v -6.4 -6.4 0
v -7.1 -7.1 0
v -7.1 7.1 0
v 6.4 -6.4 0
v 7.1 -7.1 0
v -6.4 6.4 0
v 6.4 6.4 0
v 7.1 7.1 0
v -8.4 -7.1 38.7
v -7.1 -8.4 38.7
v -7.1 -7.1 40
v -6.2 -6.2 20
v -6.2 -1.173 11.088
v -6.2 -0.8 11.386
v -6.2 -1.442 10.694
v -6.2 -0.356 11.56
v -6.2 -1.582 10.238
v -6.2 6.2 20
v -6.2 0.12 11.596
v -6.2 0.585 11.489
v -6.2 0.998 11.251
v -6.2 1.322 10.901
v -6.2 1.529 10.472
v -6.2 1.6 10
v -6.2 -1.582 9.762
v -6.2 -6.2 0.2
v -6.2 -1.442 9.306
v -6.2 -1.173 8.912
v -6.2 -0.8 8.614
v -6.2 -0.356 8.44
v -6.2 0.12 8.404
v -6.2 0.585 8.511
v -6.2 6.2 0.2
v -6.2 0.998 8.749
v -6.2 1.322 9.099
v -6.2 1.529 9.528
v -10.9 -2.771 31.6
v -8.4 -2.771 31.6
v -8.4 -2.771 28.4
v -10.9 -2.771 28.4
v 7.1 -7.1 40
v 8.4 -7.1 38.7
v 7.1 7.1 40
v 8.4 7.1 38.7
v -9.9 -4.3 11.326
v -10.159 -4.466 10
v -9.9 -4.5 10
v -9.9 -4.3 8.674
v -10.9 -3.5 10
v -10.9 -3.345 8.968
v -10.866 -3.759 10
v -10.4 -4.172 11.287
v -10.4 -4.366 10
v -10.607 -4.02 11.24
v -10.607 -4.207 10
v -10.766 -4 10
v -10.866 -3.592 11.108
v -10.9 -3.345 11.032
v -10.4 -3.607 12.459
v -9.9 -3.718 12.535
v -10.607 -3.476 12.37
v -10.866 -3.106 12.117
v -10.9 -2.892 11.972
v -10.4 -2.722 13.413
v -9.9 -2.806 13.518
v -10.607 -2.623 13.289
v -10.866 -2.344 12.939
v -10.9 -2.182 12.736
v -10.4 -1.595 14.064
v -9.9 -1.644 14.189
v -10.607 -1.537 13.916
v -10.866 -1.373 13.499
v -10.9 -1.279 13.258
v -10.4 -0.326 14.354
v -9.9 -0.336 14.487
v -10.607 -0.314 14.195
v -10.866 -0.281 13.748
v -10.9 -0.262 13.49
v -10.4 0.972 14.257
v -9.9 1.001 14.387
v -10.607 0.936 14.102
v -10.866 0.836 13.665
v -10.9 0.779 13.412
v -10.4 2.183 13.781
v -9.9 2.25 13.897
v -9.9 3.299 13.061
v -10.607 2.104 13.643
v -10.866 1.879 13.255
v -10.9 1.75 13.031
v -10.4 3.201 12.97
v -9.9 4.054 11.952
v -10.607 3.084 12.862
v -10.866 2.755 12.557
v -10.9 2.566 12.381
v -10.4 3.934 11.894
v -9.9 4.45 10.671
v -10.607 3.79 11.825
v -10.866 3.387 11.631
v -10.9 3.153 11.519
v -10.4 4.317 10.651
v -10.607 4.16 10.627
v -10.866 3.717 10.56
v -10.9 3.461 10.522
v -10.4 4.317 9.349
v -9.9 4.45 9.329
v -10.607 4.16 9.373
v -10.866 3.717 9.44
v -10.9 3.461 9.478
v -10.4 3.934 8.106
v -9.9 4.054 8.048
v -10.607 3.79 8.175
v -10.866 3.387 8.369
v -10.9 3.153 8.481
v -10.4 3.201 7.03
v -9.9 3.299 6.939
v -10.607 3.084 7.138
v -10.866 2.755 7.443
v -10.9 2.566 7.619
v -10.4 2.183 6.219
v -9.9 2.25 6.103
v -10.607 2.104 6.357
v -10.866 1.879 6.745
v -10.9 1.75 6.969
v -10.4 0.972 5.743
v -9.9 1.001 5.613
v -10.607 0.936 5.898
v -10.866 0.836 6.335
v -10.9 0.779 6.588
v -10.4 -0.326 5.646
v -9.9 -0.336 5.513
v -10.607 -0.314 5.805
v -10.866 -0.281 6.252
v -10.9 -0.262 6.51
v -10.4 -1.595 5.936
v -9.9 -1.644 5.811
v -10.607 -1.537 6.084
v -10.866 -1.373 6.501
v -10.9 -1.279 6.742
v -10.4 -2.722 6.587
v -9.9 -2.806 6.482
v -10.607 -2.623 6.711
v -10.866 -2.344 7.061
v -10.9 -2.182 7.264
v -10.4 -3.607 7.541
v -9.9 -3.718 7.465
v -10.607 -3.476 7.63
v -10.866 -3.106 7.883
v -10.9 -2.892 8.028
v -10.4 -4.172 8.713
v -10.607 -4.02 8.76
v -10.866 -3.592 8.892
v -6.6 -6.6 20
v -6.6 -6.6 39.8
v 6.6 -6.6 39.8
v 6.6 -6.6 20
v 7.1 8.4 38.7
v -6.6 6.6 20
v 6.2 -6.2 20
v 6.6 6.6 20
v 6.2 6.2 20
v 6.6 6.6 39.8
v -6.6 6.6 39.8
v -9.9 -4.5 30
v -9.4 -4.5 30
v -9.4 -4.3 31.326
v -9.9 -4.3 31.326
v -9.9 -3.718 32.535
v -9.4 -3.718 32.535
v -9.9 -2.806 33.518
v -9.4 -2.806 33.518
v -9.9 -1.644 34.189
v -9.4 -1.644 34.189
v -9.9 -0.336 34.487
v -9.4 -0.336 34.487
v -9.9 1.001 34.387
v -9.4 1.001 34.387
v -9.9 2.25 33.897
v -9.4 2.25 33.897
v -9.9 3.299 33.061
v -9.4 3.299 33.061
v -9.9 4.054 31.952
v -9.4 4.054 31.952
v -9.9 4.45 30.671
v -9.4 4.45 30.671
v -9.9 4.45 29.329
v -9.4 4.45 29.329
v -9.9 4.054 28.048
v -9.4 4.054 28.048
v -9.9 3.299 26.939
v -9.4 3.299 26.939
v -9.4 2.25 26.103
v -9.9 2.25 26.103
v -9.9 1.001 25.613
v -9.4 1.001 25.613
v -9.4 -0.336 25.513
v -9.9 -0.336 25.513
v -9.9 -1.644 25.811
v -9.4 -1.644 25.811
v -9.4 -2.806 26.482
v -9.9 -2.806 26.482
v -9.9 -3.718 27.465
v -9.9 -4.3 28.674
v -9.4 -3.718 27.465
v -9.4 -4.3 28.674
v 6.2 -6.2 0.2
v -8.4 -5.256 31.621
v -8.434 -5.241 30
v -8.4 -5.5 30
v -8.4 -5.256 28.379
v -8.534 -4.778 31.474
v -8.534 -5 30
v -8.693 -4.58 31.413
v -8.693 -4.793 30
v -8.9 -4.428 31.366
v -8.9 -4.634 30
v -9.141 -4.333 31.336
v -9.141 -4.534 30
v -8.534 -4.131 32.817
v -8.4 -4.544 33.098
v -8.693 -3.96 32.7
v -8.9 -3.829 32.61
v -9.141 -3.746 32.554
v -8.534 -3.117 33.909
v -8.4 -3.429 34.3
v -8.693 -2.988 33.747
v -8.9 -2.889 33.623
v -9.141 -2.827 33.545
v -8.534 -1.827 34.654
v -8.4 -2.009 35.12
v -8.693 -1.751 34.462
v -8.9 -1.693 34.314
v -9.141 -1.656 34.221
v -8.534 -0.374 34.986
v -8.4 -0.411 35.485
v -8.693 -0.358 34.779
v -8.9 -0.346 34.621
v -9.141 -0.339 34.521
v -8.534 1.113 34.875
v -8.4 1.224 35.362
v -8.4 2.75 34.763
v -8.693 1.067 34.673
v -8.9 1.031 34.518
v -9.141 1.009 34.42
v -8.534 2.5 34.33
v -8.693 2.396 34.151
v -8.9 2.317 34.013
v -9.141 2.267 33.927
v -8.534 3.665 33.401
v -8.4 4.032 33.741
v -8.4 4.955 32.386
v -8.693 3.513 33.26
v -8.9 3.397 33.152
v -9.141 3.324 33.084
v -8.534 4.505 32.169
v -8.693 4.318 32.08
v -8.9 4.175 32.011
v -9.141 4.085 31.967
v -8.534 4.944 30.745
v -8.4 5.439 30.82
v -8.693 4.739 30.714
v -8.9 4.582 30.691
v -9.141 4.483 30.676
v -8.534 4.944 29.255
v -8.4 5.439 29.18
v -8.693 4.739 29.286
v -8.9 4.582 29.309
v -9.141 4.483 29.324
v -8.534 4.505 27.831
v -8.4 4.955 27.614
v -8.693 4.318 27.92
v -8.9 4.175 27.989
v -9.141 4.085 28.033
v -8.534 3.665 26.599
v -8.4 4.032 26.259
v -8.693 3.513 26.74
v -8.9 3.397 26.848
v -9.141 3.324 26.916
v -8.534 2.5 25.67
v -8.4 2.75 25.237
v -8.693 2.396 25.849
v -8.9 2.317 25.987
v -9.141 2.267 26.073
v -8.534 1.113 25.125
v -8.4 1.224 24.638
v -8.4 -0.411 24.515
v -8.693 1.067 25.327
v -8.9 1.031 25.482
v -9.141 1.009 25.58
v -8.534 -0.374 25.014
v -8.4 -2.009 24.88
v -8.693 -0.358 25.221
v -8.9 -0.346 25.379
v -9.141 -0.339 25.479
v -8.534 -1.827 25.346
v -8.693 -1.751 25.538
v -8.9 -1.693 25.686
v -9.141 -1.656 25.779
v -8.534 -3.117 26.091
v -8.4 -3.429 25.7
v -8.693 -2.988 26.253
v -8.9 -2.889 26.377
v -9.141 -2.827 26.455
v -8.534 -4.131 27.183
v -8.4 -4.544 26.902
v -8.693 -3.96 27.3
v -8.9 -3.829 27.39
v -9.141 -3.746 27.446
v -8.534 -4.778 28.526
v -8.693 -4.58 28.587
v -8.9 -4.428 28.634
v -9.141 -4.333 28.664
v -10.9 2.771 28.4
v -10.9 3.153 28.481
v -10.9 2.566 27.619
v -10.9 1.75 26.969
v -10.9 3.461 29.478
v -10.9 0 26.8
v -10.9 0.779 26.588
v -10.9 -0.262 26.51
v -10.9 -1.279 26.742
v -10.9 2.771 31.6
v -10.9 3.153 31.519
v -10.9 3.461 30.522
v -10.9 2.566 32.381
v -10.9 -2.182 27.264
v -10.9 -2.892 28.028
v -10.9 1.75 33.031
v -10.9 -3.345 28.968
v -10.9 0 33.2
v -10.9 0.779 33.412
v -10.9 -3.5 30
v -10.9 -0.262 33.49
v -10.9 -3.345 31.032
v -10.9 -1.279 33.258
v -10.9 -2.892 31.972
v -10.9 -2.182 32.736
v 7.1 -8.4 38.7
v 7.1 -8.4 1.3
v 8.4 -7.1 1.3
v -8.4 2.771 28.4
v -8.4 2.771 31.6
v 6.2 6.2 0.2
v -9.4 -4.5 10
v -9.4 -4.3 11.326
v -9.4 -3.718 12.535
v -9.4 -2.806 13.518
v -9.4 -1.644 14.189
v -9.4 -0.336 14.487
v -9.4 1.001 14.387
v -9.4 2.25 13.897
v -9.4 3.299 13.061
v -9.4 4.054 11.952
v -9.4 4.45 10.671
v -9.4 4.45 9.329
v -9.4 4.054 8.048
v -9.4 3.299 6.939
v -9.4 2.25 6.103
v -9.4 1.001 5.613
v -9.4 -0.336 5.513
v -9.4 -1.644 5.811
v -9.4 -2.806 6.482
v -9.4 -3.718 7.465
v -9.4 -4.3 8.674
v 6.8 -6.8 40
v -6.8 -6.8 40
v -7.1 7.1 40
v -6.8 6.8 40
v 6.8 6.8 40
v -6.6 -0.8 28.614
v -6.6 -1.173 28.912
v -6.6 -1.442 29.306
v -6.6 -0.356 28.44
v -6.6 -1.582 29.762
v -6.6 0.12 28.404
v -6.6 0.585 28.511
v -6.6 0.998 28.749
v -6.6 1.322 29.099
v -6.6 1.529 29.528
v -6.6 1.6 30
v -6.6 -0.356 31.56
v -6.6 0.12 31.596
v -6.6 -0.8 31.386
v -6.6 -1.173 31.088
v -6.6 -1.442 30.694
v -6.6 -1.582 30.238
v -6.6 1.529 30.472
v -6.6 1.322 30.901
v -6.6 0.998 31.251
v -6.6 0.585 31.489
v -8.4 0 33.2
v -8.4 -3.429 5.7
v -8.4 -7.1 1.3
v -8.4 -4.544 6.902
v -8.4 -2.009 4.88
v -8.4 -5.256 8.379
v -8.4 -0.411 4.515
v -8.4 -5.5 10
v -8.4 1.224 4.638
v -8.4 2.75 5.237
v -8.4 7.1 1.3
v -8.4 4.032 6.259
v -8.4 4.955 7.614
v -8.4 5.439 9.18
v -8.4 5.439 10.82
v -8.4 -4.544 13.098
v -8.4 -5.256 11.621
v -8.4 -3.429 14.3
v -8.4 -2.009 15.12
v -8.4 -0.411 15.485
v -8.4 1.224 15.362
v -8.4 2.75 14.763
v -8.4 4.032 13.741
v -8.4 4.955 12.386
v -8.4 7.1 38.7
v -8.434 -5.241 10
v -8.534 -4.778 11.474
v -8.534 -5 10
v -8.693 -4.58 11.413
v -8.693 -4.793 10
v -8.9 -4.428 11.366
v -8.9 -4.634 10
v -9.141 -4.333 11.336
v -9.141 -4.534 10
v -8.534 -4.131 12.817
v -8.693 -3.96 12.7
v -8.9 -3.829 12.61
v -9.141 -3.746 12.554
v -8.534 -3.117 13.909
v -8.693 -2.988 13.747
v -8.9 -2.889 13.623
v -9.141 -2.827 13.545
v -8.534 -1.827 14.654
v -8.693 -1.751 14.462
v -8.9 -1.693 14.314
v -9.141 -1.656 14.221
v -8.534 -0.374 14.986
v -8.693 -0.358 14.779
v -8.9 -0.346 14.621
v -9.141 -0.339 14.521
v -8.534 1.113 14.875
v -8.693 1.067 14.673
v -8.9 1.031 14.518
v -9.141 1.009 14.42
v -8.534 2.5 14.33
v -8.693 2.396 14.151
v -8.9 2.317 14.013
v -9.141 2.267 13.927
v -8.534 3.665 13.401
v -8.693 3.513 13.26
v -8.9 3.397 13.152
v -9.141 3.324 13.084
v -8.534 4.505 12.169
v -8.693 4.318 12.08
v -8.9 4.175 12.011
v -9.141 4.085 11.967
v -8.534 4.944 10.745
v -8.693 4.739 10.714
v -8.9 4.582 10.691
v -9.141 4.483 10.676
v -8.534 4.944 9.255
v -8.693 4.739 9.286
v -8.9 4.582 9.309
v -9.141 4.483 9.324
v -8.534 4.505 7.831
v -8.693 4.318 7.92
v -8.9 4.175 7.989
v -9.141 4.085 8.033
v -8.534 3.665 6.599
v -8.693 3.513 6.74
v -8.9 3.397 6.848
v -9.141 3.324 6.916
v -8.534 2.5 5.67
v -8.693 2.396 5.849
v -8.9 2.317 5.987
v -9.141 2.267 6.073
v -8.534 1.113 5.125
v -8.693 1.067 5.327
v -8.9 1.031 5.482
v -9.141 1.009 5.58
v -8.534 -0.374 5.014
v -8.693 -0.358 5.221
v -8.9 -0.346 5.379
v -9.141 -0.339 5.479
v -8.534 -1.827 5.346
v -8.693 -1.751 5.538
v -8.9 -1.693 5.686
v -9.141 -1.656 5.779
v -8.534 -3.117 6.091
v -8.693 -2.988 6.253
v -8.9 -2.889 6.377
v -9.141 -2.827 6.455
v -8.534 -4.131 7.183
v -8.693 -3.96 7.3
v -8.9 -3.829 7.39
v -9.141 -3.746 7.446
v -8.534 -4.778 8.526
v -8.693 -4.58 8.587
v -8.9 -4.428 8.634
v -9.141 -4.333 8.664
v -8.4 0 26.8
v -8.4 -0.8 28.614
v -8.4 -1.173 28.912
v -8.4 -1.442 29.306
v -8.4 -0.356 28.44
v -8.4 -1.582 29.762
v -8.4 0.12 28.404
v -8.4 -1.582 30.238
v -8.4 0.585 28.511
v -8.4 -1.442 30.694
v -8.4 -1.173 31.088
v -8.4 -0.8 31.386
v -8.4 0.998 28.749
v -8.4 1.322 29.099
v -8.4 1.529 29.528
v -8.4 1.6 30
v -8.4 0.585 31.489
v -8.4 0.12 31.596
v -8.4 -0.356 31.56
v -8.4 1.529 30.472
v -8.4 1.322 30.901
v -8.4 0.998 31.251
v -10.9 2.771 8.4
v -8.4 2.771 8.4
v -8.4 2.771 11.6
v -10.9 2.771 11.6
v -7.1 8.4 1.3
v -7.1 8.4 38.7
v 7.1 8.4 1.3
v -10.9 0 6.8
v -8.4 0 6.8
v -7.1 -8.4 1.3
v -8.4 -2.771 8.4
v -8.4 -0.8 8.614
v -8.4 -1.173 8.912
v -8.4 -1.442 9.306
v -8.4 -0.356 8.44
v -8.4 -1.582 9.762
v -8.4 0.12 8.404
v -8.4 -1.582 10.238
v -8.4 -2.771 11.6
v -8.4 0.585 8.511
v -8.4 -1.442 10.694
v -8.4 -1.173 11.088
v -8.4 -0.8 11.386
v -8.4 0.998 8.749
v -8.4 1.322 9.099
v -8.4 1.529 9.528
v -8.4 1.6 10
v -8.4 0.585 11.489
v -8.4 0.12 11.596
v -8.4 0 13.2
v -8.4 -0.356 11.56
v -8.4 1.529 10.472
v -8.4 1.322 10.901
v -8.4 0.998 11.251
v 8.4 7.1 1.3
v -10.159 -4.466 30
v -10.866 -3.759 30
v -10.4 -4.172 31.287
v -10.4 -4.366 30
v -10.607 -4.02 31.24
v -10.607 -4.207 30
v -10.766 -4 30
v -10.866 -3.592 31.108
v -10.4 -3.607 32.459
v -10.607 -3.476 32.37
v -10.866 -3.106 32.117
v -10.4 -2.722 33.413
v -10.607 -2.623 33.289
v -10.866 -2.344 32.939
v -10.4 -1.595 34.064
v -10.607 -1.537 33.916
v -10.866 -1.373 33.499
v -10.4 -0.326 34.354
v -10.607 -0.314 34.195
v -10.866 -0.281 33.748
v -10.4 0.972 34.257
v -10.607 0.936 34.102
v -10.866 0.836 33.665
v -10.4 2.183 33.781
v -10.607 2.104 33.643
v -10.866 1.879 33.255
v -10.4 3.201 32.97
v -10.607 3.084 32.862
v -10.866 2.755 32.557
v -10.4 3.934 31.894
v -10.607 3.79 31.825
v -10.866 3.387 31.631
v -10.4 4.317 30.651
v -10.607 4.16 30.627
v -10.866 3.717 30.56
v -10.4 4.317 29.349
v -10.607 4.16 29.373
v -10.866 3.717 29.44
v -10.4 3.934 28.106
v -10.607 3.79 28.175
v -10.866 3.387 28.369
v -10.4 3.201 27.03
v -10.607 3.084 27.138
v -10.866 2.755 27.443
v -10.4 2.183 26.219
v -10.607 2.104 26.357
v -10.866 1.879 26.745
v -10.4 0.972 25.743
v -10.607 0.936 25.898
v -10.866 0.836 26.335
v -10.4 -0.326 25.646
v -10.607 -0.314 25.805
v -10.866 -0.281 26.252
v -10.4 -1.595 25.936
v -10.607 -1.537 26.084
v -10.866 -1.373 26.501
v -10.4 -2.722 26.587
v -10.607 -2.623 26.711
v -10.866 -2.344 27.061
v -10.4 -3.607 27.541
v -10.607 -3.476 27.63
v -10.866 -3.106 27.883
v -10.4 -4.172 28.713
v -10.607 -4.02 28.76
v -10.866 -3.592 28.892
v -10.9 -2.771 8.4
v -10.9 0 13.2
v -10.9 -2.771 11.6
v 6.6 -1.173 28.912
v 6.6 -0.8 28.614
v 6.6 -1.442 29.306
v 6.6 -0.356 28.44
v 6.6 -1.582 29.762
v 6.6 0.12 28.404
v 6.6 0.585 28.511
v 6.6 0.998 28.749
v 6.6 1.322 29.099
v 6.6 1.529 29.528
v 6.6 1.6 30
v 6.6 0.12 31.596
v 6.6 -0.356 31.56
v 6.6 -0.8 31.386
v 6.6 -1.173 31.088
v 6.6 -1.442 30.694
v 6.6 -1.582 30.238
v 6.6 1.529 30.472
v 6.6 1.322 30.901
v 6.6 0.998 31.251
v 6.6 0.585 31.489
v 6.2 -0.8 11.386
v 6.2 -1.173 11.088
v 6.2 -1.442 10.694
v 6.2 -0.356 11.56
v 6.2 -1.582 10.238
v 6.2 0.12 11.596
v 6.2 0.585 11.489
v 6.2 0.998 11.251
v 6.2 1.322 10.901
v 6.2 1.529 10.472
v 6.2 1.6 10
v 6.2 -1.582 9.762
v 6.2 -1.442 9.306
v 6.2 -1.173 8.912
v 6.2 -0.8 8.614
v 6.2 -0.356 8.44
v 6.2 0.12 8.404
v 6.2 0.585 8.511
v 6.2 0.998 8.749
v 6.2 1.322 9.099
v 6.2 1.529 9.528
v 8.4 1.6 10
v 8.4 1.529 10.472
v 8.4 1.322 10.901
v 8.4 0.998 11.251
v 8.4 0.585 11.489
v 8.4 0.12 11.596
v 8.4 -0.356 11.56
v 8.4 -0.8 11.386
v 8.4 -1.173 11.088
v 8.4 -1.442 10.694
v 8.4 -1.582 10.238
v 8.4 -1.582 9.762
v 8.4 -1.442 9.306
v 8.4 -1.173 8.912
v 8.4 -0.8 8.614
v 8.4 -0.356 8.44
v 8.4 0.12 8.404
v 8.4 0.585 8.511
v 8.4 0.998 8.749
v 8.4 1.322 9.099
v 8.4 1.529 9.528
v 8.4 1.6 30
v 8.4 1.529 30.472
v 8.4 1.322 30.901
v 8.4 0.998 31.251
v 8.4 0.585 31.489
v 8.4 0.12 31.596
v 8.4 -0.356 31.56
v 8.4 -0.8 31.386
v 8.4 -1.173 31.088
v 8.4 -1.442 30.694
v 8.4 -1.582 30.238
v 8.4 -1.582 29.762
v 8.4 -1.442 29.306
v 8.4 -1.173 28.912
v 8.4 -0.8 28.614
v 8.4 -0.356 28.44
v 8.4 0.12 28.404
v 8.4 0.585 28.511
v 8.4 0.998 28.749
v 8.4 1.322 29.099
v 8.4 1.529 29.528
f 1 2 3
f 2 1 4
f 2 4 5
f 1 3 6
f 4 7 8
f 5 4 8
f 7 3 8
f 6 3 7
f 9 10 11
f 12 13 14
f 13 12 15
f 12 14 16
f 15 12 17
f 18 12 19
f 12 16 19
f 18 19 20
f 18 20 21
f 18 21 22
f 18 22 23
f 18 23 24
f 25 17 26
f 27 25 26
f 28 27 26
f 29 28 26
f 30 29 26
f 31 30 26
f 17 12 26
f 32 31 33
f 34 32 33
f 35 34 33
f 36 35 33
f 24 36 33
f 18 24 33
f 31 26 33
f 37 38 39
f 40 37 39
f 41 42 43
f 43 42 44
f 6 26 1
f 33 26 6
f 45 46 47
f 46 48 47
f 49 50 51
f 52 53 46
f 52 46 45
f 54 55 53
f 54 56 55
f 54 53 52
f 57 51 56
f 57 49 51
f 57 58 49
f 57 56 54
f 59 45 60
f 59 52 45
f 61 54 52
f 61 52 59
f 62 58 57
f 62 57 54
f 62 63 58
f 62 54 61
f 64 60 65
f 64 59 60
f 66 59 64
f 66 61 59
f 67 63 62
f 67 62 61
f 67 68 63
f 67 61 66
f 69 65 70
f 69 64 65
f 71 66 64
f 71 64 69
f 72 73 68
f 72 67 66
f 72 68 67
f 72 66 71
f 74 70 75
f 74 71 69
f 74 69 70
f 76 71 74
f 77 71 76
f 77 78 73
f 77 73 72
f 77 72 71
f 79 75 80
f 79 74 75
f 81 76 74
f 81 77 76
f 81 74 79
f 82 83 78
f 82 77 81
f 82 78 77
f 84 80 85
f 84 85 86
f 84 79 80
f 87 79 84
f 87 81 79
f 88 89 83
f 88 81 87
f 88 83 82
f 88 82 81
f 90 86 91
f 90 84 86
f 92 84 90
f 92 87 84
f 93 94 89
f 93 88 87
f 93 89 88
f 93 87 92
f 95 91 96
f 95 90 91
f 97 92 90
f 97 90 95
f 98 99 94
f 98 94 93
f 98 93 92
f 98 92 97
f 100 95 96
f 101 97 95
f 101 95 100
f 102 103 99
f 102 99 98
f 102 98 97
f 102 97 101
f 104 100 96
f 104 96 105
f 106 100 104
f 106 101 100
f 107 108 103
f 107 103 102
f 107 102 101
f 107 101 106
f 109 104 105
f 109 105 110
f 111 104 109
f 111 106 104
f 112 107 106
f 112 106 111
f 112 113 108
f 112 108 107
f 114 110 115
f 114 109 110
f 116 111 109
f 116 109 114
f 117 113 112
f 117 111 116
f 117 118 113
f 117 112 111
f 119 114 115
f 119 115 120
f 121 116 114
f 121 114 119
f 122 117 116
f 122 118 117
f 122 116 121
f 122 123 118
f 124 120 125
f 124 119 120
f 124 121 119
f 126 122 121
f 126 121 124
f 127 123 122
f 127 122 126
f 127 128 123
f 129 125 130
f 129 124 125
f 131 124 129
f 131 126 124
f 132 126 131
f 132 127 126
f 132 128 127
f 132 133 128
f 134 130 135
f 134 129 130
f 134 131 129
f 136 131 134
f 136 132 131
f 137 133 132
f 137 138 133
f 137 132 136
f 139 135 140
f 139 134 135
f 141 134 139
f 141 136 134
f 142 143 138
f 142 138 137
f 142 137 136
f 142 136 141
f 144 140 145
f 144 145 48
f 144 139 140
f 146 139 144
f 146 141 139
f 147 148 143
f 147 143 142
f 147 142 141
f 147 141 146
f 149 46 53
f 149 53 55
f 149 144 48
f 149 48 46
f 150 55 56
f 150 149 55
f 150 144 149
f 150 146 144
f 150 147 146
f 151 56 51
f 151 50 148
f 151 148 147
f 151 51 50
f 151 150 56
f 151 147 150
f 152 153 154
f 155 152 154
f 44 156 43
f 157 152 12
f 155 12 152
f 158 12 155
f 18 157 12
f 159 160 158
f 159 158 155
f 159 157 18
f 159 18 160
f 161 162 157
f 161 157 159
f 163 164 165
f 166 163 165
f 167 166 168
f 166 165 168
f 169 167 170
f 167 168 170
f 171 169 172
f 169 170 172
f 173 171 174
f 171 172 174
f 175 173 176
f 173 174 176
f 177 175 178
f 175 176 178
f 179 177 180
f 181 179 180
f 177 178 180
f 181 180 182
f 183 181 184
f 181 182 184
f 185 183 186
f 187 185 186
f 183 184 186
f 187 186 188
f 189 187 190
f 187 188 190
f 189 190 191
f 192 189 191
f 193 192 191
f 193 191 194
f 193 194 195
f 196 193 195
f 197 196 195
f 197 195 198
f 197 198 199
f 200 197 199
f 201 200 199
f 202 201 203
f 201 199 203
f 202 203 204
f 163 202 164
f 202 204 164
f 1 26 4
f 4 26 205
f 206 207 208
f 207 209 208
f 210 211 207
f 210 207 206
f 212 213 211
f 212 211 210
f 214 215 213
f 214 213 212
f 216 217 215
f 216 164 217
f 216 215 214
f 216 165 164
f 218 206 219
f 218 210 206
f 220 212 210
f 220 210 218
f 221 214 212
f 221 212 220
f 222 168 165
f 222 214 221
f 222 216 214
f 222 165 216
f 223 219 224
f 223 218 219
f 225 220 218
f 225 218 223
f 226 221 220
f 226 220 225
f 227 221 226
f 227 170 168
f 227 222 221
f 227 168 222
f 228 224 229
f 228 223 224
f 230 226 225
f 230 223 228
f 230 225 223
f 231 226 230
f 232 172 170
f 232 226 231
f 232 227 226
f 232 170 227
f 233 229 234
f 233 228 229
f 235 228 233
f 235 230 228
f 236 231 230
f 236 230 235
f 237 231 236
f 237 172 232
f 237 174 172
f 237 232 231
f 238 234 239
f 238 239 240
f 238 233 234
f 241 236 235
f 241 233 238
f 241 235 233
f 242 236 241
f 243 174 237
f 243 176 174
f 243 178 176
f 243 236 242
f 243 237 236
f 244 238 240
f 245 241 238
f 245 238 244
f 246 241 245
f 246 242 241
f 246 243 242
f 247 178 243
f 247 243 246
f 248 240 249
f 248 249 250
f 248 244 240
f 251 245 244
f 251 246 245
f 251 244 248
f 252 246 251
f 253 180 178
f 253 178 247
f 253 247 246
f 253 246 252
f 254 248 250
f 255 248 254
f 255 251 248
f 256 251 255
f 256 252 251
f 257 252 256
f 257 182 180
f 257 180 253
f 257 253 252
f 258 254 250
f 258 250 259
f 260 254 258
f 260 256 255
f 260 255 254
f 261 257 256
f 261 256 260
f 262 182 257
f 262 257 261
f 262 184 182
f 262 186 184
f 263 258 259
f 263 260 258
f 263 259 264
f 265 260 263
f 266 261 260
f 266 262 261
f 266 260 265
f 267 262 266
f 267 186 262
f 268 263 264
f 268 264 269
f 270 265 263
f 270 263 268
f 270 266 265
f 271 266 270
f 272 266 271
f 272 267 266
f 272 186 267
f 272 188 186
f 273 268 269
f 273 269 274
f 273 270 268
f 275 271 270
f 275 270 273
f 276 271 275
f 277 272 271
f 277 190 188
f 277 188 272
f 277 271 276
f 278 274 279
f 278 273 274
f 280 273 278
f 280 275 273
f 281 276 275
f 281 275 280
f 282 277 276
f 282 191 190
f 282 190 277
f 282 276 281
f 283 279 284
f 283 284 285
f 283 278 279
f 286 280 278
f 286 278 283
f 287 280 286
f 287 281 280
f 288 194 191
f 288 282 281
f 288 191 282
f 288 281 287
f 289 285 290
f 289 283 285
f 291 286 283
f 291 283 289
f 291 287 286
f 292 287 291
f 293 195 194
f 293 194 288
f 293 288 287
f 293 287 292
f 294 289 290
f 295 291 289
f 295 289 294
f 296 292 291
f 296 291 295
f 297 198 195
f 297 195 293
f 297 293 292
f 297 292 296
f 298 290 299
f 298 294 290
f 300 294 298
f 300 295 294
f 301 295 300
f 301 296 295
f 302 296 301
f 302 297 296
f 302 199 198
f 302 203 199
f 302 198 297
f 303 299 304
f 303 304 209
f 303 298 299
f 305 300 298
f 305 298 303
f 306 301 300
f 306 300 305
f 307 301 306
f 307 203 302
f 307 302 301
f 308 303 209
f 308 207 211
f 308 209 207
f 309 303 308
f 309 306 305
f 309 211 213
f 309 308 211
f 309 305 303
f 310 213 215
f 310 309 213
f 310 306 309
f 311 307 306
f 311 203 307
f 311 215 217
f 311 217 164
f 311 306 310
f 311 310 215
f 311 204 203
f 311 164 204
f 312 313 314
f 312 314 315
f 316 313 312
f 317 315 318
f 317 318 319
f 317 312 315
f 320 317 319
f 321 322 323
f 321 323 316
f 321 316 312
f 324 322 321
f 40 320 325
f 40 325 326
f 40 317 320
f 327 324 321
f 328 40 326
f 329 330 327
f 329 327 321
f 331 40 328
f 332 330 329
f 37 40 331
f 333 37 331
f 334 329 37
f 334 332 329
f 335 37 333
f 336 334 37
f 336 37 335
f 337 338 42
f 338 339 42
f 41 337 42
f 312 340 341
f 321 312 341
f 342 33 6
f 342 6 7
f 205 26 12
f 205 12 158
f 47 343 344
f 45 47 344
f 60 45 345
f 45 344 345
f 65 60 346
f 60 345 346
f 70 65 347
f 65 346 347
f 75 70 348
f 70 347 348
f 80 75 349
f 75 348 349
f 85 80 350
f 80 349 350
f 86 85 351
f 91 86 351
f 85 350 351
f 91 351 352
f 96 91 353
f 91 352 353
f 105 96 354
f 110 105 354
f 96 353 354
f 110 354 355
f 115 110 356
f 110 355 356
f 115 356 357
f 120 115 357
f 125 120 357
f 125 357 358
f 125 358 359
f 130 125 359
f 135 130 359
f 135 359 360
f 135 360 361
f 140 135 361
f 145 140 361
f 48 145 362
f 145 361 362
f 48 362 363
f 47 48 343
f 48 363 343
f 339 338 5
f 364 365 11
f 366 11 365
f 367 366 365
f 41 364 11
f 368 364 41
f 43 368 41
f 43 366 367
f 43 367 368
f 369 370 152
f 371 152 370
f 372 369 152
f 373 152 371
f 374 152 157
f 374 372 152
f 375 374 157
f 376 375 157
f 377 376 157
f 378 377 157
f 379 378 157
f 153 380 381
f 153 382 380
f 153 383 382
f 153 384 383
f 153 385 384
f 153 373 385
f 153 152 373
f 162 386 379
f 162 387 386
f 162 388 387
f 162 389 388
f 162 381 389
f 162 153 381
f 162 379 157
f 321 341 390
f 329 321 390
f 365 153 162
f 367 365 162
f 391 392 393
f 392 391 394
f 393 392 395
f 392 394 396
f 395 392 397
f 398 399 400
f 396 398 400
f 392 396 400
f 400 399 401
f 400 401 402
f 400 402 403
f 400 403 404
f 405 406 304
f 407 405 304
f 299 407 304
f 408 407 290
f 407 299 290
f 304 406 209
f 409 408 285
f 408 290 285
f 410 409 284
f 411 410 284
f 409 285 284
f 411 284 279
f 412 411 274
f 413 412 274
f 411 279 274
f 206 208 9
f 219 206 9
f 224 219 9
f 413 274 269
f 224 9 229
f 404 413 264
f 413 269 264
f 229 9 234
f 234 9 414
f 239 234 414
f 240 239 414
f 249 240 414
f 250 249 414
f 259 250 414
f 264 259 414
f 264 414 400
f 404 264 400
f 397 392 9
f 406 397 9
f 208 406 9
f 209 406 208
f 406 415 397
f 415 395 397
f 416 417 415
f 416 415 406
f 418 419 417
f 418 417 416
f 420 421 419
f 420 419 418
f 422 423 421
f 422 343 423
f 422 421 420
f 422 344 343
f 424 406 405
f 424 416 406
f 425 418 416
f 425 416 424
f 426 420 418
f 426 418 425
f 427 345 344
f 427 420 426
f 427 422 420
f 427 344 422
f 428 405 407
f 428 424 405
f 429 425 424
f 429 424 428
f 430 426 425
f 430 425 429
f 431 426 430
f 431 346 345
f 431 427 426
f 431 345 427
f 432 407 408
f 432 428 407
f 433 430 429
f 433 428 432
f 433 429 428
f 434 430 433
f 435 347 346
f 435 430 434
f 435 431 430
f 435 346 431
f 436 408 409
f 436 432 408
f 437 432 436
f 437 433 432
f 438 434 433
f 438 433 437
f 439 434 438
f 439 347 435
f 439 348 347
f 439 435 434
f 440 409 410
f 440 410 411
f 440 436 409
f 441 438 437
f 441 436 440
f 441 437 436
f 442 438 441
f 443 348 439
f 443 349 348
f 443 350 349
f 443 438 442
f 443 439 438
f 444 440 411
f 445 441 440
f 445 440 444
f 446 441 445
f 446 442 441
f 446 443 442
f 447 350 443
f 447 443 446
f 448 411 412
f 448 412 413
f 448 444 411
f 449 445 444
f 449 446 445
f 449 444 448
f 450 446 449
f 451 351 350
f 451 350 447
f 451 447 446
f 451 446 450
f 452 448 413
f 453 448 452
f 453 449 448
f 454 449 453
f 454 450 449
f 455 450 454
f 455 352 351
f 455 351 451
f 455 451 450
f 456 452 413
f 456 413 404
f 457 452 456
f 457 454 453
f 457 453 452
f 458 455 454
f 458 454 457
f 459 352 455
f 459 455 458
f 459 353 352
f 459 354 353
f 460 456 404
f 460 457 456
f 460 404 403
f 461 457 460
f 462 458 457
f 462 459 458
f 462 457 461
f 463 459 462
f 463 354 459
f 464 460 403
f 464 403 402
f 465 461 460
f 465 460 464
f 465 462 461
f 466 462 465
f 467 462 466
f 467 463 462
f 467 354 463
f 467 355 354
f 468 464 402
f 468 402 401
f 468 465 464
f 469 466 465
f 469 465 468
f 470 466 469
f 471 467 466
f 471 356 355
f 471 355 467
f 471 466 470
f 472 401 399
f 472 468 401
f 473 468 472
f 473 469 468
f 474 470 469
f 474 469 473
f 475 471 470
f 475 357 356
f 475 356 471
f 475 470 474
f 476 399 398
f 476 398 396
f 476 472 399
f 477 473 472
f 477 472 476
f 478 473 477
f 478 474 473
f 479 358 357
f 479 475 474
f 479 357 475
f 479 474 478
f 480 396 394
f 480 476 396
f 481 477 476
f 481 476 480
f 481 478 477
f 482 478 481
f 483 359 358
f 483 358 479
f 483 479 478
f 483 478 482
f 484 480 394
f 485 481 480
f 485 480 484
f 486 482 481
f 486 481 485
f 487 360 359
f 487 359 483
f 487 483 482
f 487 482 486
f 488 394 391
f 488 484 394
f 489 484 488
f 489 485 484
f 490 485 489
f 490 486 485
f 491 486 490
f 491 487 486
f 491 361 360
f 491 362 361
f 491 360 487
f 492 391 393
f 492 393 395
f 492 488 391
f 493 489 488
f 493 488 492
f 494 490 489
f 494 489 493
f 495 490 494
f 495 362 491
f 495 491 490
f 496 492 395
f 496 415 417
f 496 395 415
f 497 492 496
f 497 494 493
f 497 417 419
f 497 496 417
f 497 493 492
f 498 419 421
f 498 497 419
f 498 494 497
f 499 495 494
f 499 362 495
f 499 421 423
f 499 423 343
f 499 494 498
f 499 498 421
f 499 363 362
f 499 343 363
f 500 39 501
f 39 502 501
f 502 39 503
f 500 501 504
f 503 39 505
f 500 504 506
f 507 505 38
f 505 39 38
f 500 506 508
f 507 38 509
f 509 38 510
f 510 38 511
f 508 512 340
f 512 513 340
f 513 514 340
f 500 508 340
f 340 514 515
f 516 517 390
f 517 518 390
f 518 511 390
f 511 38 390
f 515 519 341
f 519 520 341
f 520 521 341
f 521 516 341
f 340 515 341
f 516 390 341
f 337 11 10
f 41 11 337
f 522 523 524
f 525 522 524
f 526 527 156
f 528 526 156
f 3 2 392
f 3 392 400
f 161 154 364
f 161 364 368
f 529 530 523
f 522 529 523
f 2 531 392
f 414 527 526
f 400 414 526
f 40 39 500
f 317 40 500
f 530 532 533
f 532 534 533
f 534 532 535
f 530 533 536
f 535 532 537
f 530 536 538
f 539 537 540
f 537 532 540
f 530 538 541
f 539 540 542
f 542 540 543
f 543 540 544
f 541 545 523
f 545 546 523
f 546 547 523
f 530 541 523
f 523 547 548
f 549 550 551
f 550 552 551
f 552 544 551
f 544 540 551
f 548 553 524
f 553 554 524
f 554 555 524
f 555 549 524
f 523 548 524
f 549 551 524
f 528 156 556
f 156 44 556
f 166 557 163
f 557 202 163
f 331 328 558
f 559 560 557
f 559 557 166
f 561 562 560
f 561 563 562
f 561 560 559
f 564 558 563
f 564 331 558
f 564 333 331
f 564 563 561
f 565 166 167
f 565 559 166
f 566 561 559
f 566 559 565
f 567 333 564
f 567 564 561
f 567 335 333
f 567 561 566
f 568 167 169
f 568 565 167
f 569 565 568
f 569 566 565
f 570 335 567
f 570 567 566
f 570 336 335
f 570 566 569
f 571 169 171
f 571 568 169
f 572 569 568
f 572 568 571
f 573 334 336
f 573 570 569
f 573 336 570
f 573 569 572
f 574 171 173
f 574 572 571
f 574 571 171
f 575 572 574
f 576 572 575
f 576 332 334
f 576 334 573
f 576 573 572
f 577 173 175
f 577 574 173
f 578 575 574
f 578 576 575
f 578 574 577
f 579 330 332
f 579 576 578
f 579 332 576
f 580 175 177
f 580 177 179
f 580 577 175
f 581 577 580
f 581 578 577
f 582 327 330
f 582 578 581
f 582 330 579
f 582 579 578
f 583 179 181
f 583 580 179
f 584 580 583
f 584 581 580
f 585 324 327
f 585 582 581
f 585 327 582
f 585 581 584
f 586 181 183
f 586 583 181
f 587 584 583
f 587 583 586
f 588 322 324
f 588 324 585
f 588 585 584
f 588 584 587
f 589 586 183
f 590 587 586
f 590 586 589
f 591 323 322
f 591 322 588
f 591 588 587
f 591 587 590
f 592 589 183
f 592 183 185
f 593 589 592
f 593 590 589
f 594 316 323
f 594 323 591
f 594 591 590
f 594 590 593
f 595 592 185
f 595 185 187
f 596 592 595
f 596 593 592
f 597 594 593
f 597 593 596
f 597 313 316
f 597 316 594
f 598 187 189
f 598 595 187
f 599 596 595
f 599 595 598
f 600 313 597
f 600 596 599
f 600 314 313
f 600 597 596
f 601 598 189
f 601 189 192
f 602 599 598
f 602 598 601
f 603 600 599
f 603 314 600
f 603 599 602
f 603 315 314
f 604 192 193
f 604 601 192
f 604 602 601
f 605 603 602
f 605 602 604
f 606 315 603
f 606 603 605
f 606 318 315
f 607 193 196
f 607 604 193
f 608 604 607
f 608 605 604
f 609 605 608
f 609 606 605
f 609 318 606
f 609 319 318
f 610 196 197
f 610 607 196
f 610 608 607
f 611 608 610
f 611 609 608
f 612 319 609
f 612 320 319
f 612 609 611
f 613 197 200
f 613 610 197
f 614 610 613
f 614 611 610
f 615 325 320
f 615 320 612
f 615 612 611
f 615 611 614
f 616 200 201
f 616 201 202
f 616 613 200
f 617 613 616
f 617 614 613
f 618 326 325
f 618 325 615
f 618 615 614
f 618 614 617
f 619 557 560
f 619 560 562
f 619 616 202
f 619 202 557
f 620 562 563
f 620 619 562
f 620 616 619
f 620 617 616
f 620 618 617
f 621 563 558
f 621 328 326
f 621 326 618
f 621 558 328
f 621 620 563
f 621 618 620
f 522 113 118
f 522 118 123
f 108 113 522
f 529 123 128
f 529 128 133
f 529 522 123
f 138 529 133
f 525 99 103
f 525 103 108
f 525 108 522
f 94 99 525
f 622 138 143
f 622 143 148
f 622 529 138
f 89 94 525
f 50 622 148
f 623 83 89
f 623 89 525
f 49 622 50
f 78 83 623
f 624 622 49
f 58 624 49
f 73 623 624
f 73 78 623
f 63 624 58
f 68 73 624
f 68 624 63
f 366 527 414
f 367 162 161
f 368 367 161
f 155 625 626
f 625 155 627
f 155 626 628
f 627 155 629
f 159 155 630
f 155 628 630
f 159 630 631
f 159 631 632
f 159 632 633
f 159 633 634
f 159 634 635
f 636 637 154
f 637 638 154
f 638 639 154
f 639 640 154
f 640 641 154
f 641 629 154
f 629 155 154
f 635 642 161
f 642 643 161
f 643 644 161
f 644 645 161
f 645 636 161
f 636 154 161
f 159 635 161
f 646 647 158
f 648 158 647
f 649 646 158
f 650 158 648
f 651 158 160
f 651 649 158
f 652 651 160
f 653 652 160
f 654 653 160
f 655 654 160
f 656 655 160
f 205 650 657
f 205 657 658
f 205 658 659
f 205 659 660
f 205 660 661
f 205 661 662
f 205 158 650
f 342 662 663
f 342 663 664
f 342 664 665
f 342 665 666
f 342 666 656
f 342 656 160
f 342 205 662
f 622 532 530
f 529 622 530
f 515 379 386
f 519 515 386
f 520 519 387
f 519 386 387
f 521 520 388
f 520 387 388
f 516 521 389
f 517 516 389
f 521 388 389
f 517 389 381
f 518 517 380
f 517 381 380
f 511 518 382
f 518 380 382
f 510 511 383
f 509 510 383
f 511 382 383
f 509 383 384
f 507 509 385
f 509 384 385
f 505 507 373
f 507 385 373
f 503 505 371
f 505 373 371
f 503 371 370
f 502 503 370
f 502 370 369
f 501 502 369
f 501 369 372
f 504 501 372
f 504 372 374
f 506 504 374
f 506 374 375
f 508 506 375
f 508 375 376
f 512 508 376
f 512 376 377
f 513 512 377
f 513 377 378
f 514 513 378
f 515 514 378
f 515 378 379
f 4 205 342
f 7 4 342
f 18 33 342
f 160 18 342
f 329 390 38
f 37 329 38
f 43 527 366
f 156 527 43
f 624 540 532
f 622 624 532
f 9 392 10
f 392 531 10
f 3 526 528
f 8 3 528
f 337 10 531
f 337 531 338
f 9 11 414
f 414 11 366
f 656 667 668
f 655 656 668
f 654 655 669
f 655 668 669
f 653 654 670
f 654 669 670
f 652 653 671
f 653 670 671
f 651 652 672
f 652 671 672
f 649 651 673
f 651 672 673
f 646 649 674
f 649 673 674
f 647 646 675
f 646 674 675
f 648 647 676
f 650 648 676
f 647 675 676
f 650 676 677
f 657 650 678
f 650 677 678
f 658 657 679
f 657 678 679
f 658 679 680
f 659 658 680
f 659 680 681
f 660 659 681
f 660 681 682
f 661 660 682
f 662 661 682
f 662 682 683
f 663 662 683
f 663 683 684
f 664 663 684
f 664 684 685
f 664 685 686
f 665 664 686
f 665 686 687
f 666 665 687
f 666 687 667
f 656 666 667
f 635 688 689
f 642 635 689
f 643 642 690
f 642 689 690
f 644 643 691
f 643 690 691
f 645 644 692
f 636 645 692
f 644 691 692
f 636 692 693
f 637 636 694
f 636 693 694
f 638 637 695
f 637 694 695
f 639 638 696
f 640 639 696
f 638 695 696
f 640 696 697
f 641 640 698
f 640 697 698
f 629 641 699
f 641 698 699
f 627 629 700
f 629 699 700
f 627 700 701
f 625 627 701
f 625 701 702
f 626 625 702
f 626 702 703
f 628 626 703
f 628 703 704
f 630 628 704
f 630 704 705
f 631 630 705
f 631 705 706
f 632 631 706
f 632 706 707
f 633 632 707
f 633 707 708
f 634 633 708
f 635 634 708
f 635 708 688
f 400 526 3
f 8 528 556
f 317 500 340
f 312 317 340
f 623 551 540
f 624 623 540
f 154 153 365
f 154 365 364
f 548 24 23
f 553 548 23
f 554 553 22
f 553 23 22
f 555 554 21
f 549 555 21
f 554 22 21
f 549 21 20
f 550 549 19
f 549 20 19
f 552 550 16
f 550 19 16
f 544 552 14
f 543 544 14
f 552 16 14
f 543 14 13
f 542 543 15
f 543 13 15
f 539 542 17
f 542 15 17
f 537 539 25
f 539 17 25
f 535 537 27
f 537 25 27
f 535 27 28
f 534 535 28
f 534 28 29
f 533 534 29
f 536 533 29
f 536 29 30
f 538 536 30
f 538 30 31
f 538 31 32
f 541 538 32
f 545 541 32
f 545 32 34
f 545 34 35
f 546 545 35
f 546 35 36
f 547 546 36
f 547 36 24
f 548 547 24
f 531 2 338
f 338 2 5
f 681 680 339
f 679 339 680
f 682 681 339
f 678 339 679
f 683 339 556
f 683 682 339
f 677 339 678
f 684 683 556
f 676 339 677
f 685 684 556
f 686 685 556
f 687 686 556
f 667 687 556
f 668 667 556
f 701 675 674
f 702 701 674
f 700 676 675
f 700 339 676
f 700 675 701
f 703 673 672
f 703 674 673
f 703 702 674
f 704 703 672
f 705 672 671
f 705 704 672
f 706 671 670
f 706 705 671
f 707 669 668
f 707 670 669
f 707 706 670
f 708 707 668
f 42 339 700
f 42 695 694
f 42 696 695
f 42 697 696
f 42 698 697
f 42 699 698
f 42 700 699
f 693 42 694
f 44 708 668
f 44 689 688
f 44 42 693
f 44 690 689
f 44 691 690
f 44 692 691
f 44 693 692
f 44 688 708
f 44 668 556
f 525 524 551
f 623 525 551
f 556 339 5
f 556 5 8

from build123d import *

# Parameters (mm, degrees)
F0_W     = 16.8
F0_H     = 16.8
F0_W_2   = 12.4
F0_H_2   = 12.4
F3_DEPTH = 20
F2_W     = 16.8
F2_H     = 16.8
F2_W_2   = 13.2
F2_H_2   = 13.2
F4_DEPTH = 20
F5_R     = 1.6
F6_DEPTH = 25
F7_R     = 4.5
F8_DEPTH = 2.5
F9_SIZE  = 0.2
F10_R    = 1
F11_SIZE = 1.3


with BuildPart() as f3:
    # F0 (on Top) → F3 (new body)
    with BuildSketch(Plane.XY):
        Rectangle(F0_W, F0_H)
        Rectangle(F0_W_2, F0_H_2, mode=Mode.SUBTRACT)
    extrude(amount=F3_DEPTH)

    # F2 (on offset) → F4 (join)
    with BuildSketch(Plane.XY.offset(40)):
        Rectangle(F2_W, F2_H)
        Rectangle(F2_W_2, F2_H_2, mode=Mode.SUBTRACT)
    extrude(amount=-F4_DEPTH)

    # F5 (on face) → F6 (cut)
    with BuildSketch(Plane.YZ.offset(8.4)):
        with Locations((0, 30)):
            Circle(F5_R)
        with Locations((0, 10)):
            Circle(F5_R)
    extrude(amount=-F6_DEPTH, mode=Mode.SUBTRACT)

    # F7 (on face) → F8 (join)
    with BuildSketch(Plane(origin=(-8.4, 0, 0), x_dir=(0, -1, 0), z_dir=(-1, 0, 0))):
        with Locations((0, 10)):
            Circle(F7_R)
        Polygon((0, 13.2), (2.771281, 11.6), (2.771281, 8.4), (0, 6.8), (-2.771281, 8.4), (-2.771281, 11.6), align=None, mode=Mode.SUBTRACT)
        with Locations((0, 30)):
            Circle(F7_R)
        Polygon((0, 33.2), (2.771281, 31.6), (2.771281, 28.4), (0, 26.8), (-2.771281, 28.4), (-2.771281, 31.6), align=None, mode=Mode.SUBTRACT)
    extrude(amount=F8_DEPTH)

    # F9
    f9_edges = [f3.edges().sort_by_distance(p)[0] for p in [
        (0, 6.6, 40),
        (-6.6, 0, 40),
        (0, -6.6, 40),
        (6.6, 0, 40),
        (0, -6.2, 0),
        (6.2, 0, 0),
        (0, 6.2, 0),
        (-6.2, 0, 0),
    ]]
    chamfer(f9_edges, length=F9_SIZE)

    # F10
    f10_edges = [f3.edges().sort_by_distance(p)[0] for p in [
        (-8.4, 4.5, 10),
        (-10.9, 4.5, 10),
        (-10.9, 4.5, 30),
        (-8.4, 4.5, 30),
    ]]
    fillet(f10_edges, radius=F10_R)

    # F11
    f11_edges = [f3.edges().sort_by_distance(p)[0] for p in [
        (8.4, 8.4, 20),
        (0, 8.4, 40),
        (-8.4, 8.4, 20),
        (0, 8.4, 0),
        (-8.4, -8.4, 20),
        (0, -8.4, 40),
        (8.4, -8.4, 20),
        (0, -8.4, 0),
        (8.4, 0, 0),
        (-8.4, 0, 0),
        (-8.4, 0, 40),
        (8.4, 0, 40),
    ]]
    chamfer(f11_edges, length=F11_SIZE)


solid = f3.part
